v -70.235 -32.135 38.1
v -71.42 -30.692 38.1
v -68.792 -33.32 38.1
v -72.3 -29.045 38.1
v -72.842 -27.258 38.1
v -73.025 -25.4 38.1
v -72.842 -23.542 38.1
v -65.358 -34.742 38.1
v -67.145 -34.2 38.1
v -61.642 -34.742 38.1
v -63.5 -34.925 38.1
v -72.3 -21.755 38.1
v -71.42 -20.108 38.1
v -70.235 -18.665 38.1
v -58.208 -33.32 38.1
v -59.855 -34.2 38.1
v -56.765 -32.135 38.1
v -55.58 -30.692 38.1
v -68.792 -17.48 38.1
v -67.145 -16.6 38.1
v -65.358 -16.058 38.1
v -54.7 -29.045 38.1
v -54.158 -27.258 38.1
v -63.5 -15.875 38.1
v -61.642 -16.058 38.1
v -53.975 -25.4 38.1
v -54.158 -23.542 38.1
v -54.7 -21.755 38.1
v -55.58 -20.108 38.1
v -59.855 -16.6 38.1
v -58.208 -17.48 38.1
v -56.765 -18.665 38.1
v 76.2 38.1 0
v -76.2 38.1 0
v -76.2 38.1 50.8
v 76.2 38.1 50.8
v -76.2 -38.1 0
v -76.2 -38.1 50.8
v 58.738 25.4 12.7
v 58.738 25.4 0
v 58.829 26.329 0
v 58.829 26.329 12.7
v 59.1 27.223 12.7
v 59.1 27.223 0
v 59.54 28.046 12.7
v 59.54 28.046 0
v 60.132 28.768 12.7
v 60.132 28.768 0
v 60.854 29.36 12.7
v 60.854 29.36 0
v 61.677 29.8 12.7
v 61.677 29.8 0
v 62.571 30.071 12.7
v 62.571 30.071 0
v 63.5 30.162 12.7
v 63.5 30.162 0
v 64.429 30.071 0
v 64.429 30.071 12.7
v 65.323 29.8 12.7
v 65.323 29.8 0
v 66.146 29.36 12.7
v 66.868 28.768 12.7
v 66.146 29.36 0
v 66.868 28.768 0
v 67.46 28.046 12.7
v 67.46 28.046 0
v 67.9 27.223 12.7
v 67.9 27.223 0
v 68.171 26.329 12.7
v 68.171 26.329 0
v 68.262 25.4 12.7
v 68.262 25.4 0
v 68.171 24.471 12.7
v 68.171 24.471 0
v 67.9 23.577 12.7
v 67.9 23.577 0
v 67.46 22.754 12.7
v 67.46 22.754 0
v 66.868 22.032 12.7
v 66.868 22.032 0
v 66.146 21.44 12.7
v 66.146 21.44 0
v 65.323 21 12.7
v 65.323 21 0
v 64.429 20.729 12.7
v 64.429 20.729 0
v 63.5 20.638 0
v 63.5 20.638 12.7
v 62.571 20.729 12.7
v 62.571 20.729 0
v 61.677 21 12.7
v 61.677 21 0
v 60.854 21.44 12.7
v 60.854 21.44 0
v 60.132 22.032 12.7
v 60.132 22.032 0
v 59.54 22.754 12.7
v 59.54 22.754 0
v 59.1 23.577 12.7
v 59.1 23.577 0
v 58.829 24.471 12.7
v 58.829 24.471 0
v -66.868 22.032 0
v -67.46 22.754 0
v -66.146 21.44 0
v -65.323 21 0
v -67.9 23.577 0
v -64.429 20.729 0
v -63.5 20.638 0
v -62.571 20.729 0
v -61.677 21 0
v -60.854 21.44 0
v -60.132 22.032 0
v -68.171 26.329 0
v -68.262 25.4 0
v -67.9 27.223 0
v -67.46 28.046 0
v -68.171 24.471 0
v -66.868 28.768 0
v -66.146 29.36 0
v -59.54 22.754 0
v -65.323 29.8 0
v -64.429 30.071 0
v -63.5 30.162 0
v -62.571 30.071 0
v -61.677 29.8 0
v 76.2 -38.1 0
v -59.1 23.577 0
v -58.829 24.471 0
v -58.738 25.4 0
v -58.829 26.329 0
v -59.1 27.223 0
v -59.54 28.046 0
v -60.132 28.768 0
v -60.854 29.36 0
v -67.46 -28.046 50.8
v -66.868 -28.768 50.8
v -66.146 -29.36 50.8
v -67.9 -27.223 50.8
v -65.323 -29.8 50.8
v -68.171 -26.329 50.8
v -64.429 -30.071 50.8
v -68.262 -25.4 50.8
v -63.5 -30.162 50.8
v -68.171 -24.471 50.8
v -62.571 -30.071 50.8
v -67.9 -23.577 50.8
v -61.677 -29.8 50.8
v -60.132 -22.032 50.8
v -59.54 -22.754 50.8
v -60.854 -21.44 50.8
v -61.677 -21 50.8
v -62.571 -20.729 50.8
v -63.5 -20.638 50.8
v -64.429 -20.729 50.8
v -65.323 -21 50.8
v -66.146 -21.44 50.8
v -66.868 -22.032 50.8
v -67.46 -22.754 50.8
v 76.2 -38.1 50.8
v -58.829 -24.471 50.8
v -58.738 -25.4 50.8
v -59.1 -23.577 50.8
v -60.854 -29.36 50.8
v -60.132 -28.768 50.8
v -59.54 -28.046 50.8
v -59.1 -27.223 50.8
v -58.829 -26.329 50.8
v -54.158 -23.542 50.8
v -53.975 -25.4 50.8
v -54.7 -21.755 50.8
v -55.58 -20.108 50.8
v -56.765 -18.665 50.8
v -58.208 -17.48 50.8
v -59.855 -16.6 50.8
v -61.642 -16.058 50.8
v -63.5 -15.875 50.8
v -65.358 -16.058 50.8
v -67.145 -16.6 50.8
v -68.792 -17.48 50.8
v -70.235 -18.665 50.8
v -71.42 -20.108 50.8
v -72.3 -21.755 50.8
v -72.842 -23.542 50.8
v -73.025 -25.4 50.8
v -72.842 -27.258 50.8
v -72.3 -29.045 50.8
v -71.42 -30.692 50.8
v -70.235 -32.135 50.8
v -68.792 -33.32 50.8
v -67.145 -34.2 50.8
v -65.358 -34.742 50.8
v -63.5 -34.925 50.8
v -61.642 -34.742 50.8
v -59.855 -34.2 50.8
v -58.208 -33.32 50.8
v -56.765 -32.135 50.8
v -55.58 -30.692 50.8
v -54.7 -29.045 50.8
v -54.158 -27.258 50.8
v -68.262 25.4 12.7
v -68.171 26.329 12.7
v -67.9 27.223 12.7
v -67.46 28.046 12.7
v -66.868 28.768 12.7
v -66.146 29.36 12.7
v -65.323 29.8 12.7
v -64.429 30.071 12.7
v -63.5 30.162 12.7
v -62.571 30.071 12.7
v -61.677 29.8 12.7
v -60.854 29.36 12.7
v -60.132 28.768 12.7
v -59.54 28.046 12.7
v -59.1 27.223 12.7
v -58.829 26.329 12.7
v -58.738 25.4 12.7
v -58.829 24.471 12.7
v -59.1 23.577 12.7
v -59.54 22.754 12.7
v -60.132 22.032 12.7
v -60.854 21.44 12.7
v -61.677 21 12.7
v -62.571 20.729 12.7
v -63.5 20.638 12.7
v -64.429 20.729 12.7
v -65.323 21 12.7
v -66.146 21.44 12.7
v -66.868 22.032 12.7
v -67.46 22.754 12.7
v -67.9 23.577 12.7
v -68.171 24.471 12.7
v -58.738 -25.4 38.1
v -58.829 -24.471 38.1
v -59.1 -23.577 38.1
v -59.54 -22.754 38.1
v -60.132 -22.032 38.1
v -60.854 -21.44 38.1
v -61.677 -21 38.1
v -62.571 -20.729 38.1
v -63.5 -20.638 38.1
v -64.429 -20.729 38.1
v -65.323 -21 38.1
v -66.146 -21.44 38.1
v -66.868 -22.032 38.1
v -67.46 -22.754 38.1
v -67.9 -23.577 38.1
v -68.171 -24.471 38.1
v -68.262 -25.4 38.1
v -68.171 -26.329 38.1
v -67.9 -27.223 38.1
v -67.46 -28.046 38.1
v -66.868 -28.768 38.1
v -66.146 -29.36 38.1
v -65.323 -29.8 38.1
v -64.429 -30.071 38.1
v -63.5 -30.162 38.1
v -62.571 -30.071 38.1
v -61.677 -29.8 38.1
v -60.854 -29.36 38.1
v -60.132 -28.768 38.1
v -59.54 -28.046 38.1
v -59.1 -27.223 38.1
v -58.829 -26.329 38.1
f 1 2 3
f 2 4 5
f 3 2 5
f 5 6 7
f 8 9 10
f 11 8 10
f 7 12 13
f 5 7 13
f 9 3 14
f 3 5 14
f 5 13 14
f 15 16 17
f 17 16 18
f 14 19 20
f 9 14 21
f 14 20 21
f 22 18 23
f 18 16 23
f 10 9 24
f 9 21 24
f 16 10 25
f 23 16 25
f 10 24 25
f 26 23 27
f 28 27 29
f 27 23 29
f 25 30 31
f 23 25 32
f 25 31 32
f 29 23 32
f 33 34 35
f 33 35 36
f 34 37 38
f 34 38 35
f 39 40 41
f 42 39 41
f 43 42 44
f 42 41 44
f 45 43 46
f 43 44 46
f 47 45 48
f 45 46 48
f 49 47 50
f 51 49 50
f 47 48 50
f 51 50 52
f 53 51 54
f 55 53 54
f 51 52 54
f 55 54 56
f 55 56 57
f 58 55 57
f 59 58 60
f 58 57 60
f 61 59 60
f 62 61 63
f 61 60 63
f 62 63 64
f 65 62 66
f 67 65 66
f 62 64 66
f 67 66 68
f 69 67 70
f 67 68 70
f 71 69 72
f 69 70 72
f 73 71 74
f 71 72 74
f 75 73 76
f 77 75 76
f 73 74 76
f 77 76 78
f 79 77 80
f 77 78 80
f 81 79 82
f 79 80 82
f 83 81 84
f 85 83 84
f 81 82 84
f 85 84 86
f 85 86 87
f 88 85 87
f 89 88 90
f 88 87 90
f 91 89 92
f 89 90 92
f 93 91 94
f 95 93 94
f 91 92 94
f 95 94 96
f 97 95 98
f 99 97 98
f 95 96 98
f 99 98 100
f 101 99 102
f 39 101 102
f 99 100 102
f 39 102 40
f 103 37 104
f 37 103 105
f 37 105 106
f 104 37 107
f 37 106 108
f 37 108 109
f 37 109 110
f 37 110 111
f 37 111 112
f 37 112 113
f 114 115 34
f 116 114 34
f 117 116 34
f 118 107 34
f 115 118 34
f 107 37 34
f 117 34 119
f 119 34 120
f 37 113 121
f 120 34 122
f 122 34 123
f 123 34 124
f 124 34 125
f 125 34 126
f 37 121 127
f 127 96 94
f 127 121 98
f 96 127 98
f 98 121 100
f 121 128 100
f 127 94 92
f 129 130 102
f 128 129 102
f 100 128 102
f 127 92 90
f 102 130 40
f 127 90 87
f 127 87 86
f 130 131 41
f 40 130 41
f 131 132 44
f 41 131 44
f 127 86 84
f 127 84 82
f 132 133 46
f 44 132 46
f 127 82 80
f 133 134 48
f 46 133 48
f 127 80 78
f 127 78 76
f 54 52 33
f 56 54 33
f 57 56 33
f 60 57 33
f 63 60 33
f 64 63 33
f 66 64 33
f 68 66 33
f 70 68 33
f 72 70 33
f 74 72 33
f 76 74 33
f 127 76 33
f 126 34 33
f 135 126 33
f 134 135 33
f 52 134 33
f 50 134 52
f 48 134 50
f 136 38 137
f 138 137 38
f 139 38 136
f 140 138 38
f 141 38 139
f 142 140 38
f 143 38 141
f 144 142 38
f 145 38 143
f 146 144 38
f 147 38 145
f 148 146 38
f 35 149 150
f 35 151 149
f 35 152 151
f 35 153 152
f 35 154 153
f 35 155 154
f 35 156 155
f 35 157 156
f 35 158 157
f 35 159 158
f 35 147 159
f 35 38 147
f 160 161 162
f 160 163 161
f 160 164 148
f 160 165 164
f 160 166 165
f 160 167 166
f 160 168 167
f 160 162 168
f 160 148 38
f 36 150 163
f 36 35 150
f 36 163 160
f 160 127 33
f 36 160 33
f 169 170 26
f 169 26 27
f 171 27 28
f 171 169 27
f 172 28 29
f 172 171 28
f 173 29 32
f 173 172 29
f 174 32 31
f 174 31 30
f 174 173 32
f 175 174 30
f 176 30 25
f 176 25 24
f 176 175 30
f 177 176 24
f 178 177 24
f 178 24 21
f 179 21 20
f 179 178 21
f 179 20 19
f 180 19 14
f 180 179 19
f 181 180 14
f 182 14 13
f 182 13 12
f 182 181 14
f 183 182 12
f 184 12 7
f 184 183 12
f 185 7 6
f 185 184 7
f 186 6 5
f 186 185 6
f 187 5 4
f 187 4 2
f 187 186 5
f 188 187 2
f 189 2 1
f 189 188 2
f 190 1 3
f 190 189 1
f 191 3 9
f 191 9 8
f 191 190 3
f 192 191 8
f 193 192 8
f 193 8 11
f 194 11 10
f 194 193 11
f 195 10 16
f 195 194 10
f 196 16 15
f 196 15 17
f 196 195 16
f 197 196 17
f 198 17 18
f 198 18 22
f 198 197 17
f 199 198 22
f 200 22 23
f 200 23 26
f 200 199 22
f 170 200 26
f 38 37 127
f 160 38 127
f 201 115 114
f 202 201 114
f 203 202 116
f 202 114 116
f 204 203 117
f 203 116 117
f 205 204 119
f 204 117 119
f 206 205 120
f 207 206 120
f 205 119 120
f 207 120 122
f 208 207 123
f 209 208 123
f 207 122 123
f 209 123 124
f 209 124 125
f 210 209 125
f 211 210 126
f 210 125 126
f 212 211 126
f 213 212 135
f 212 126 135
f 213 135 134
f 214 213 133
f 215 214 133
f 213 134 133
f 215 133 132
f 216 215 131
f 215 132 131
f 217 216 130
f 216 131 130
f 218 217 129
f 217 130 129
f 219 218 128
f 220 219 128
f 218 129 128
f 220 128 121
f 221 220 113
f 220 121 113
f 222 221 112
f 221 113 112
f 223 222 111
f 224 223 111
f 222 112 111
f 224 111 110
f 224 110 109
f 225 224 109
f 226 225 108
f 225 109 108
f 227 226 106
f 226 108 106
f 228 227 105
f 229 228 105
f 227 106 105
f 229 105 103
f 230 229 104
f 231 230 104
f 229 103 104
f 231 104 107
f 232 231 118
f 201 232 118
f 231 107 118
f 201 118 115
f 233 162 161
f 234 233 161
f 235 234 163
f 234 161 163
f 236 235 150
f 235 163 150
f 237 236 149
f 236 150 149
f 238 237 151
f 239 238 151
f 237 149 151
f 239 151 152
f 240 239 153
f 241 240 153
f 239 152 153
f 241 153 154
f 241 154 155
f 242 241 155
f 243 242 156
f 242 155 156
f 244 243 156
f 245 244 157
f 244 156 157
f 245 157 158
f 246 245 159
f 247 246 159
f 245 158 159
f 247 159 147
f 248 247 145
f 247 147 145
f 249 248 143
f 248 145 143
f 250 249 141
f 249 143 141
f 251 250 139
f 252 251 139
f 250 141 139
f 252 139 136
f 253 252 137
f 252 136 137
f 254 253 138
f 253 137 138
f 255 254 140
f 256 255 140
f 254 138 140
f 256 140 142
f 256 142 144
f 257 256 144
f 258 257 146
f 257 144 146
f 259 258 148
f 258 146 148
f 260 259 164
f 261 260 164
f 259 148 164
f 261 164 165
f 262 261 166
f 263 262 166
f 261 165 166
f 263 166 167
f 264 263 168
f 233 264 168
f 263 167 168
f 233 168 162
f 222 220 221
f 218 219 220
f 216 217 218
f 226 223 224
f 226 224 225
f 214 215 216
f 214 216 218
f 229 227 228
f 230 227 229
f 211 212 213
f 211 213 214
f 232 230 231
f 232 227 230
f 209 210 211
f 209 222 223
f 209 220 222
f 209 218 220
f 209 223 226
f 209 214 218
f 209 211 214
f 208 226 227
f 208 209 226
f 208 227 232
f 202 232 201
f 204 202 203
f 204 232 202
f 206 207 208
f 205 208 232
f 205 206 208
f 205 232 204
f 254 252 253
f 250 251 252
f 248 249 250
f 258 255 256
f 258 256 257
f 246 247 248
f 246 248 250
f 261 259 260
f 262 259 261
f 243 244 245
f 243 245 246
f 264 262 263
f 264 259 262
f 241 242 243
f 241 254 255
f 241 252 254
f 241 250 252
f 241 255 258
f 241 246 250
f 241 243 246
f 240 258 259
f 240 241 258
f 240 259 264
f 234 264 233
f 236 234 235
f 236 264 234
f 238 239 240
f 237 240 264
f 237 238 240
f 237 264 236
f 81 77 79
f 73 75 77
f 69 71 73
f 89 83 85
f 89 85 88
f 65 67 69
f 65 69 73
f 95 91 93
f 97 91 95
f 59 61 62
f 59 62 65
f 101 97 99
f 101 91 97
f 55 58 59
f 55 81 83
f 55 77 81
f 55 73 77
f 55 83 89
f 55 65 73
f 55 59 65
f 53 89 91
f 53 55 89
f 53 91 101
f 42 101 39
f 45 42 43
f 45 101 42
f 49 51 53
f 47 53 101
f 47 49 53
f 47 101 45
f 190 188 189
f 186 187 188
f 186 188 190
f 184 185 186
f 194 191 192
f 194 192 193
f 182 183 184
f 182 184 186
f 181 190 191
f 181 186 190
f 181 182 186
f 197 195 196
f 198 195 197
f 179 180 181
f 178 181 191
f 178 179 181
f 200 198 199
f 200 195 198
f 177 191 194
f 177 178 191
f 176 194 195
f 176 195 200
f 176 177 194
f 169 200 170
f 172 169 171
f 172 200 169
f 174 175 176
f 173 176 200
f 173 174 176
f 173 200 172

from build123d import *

# Parameters (mm, degrees)
SKETCH1_W           = 152.4
SKETCH1_H           = 76.2
BOSS_EXTRUDE1_DEPTH = 50.8
SKETCH2_R           = 4.7625
CUT_EXTRUDE1_DEPTH  = 12.7
SKETCH3_R           = 4.7625
CUT_EXTRUDE2_DEPTH  = 12.7
SKETCH4_R           = 9.525
BOSS_EXTRUDE2_DEPTH = 12.7


with BuildPart() as part:
    # Sketch1 → Boss-Extrude1 (new body)
    with BuildSketch(Plane.XY):
        Rectangle(SKETCH1_W, SKETCH1_H)
    extrude(amount=BOSS_EXTRUDE1_DEPTH)

    # Sketch2 → Cut-Extrude1 (cut)
    with BuildSketch(Plane.XY.offset(50.8)):
        with Locations((-63.5, -25.4)):
            Circle(SKETCH2_R)
    extrude(amount=-CUT_EXTRUDE1_DEPTH, mode=Mode.SUBTRACT)

    # Sketch3 → Cut-Extrude2 (cut)
    with BuildSketch(Plane(origin=(0, 0, 0), x_dir=(-1, 0, 0), z_dir=(0, 0, -1))):
        with Locations((63.5, 25.4)):
            Circle(SKETCH3_R)
        with Locations((-63.5, 25.4)):
            Circle(SKETCH3_R)
    extrude(amount=-CUT_EXTRUDE2_DEPTH, mode=Mode.SUBTRACT)


with BuildPart() as body_2:
    # Sketch4 → Boss-Extrude2 (new body)
    with BuildSketch(Plane.XY.offset(50.8)):
        with Locations((-63.5, -25.4)):
            Circle(SKETCH4_R)
    extrude(amount=-BOSS_EXTRUDE2_DEPTH)


solid = Compound([part.part, body_2.part])
